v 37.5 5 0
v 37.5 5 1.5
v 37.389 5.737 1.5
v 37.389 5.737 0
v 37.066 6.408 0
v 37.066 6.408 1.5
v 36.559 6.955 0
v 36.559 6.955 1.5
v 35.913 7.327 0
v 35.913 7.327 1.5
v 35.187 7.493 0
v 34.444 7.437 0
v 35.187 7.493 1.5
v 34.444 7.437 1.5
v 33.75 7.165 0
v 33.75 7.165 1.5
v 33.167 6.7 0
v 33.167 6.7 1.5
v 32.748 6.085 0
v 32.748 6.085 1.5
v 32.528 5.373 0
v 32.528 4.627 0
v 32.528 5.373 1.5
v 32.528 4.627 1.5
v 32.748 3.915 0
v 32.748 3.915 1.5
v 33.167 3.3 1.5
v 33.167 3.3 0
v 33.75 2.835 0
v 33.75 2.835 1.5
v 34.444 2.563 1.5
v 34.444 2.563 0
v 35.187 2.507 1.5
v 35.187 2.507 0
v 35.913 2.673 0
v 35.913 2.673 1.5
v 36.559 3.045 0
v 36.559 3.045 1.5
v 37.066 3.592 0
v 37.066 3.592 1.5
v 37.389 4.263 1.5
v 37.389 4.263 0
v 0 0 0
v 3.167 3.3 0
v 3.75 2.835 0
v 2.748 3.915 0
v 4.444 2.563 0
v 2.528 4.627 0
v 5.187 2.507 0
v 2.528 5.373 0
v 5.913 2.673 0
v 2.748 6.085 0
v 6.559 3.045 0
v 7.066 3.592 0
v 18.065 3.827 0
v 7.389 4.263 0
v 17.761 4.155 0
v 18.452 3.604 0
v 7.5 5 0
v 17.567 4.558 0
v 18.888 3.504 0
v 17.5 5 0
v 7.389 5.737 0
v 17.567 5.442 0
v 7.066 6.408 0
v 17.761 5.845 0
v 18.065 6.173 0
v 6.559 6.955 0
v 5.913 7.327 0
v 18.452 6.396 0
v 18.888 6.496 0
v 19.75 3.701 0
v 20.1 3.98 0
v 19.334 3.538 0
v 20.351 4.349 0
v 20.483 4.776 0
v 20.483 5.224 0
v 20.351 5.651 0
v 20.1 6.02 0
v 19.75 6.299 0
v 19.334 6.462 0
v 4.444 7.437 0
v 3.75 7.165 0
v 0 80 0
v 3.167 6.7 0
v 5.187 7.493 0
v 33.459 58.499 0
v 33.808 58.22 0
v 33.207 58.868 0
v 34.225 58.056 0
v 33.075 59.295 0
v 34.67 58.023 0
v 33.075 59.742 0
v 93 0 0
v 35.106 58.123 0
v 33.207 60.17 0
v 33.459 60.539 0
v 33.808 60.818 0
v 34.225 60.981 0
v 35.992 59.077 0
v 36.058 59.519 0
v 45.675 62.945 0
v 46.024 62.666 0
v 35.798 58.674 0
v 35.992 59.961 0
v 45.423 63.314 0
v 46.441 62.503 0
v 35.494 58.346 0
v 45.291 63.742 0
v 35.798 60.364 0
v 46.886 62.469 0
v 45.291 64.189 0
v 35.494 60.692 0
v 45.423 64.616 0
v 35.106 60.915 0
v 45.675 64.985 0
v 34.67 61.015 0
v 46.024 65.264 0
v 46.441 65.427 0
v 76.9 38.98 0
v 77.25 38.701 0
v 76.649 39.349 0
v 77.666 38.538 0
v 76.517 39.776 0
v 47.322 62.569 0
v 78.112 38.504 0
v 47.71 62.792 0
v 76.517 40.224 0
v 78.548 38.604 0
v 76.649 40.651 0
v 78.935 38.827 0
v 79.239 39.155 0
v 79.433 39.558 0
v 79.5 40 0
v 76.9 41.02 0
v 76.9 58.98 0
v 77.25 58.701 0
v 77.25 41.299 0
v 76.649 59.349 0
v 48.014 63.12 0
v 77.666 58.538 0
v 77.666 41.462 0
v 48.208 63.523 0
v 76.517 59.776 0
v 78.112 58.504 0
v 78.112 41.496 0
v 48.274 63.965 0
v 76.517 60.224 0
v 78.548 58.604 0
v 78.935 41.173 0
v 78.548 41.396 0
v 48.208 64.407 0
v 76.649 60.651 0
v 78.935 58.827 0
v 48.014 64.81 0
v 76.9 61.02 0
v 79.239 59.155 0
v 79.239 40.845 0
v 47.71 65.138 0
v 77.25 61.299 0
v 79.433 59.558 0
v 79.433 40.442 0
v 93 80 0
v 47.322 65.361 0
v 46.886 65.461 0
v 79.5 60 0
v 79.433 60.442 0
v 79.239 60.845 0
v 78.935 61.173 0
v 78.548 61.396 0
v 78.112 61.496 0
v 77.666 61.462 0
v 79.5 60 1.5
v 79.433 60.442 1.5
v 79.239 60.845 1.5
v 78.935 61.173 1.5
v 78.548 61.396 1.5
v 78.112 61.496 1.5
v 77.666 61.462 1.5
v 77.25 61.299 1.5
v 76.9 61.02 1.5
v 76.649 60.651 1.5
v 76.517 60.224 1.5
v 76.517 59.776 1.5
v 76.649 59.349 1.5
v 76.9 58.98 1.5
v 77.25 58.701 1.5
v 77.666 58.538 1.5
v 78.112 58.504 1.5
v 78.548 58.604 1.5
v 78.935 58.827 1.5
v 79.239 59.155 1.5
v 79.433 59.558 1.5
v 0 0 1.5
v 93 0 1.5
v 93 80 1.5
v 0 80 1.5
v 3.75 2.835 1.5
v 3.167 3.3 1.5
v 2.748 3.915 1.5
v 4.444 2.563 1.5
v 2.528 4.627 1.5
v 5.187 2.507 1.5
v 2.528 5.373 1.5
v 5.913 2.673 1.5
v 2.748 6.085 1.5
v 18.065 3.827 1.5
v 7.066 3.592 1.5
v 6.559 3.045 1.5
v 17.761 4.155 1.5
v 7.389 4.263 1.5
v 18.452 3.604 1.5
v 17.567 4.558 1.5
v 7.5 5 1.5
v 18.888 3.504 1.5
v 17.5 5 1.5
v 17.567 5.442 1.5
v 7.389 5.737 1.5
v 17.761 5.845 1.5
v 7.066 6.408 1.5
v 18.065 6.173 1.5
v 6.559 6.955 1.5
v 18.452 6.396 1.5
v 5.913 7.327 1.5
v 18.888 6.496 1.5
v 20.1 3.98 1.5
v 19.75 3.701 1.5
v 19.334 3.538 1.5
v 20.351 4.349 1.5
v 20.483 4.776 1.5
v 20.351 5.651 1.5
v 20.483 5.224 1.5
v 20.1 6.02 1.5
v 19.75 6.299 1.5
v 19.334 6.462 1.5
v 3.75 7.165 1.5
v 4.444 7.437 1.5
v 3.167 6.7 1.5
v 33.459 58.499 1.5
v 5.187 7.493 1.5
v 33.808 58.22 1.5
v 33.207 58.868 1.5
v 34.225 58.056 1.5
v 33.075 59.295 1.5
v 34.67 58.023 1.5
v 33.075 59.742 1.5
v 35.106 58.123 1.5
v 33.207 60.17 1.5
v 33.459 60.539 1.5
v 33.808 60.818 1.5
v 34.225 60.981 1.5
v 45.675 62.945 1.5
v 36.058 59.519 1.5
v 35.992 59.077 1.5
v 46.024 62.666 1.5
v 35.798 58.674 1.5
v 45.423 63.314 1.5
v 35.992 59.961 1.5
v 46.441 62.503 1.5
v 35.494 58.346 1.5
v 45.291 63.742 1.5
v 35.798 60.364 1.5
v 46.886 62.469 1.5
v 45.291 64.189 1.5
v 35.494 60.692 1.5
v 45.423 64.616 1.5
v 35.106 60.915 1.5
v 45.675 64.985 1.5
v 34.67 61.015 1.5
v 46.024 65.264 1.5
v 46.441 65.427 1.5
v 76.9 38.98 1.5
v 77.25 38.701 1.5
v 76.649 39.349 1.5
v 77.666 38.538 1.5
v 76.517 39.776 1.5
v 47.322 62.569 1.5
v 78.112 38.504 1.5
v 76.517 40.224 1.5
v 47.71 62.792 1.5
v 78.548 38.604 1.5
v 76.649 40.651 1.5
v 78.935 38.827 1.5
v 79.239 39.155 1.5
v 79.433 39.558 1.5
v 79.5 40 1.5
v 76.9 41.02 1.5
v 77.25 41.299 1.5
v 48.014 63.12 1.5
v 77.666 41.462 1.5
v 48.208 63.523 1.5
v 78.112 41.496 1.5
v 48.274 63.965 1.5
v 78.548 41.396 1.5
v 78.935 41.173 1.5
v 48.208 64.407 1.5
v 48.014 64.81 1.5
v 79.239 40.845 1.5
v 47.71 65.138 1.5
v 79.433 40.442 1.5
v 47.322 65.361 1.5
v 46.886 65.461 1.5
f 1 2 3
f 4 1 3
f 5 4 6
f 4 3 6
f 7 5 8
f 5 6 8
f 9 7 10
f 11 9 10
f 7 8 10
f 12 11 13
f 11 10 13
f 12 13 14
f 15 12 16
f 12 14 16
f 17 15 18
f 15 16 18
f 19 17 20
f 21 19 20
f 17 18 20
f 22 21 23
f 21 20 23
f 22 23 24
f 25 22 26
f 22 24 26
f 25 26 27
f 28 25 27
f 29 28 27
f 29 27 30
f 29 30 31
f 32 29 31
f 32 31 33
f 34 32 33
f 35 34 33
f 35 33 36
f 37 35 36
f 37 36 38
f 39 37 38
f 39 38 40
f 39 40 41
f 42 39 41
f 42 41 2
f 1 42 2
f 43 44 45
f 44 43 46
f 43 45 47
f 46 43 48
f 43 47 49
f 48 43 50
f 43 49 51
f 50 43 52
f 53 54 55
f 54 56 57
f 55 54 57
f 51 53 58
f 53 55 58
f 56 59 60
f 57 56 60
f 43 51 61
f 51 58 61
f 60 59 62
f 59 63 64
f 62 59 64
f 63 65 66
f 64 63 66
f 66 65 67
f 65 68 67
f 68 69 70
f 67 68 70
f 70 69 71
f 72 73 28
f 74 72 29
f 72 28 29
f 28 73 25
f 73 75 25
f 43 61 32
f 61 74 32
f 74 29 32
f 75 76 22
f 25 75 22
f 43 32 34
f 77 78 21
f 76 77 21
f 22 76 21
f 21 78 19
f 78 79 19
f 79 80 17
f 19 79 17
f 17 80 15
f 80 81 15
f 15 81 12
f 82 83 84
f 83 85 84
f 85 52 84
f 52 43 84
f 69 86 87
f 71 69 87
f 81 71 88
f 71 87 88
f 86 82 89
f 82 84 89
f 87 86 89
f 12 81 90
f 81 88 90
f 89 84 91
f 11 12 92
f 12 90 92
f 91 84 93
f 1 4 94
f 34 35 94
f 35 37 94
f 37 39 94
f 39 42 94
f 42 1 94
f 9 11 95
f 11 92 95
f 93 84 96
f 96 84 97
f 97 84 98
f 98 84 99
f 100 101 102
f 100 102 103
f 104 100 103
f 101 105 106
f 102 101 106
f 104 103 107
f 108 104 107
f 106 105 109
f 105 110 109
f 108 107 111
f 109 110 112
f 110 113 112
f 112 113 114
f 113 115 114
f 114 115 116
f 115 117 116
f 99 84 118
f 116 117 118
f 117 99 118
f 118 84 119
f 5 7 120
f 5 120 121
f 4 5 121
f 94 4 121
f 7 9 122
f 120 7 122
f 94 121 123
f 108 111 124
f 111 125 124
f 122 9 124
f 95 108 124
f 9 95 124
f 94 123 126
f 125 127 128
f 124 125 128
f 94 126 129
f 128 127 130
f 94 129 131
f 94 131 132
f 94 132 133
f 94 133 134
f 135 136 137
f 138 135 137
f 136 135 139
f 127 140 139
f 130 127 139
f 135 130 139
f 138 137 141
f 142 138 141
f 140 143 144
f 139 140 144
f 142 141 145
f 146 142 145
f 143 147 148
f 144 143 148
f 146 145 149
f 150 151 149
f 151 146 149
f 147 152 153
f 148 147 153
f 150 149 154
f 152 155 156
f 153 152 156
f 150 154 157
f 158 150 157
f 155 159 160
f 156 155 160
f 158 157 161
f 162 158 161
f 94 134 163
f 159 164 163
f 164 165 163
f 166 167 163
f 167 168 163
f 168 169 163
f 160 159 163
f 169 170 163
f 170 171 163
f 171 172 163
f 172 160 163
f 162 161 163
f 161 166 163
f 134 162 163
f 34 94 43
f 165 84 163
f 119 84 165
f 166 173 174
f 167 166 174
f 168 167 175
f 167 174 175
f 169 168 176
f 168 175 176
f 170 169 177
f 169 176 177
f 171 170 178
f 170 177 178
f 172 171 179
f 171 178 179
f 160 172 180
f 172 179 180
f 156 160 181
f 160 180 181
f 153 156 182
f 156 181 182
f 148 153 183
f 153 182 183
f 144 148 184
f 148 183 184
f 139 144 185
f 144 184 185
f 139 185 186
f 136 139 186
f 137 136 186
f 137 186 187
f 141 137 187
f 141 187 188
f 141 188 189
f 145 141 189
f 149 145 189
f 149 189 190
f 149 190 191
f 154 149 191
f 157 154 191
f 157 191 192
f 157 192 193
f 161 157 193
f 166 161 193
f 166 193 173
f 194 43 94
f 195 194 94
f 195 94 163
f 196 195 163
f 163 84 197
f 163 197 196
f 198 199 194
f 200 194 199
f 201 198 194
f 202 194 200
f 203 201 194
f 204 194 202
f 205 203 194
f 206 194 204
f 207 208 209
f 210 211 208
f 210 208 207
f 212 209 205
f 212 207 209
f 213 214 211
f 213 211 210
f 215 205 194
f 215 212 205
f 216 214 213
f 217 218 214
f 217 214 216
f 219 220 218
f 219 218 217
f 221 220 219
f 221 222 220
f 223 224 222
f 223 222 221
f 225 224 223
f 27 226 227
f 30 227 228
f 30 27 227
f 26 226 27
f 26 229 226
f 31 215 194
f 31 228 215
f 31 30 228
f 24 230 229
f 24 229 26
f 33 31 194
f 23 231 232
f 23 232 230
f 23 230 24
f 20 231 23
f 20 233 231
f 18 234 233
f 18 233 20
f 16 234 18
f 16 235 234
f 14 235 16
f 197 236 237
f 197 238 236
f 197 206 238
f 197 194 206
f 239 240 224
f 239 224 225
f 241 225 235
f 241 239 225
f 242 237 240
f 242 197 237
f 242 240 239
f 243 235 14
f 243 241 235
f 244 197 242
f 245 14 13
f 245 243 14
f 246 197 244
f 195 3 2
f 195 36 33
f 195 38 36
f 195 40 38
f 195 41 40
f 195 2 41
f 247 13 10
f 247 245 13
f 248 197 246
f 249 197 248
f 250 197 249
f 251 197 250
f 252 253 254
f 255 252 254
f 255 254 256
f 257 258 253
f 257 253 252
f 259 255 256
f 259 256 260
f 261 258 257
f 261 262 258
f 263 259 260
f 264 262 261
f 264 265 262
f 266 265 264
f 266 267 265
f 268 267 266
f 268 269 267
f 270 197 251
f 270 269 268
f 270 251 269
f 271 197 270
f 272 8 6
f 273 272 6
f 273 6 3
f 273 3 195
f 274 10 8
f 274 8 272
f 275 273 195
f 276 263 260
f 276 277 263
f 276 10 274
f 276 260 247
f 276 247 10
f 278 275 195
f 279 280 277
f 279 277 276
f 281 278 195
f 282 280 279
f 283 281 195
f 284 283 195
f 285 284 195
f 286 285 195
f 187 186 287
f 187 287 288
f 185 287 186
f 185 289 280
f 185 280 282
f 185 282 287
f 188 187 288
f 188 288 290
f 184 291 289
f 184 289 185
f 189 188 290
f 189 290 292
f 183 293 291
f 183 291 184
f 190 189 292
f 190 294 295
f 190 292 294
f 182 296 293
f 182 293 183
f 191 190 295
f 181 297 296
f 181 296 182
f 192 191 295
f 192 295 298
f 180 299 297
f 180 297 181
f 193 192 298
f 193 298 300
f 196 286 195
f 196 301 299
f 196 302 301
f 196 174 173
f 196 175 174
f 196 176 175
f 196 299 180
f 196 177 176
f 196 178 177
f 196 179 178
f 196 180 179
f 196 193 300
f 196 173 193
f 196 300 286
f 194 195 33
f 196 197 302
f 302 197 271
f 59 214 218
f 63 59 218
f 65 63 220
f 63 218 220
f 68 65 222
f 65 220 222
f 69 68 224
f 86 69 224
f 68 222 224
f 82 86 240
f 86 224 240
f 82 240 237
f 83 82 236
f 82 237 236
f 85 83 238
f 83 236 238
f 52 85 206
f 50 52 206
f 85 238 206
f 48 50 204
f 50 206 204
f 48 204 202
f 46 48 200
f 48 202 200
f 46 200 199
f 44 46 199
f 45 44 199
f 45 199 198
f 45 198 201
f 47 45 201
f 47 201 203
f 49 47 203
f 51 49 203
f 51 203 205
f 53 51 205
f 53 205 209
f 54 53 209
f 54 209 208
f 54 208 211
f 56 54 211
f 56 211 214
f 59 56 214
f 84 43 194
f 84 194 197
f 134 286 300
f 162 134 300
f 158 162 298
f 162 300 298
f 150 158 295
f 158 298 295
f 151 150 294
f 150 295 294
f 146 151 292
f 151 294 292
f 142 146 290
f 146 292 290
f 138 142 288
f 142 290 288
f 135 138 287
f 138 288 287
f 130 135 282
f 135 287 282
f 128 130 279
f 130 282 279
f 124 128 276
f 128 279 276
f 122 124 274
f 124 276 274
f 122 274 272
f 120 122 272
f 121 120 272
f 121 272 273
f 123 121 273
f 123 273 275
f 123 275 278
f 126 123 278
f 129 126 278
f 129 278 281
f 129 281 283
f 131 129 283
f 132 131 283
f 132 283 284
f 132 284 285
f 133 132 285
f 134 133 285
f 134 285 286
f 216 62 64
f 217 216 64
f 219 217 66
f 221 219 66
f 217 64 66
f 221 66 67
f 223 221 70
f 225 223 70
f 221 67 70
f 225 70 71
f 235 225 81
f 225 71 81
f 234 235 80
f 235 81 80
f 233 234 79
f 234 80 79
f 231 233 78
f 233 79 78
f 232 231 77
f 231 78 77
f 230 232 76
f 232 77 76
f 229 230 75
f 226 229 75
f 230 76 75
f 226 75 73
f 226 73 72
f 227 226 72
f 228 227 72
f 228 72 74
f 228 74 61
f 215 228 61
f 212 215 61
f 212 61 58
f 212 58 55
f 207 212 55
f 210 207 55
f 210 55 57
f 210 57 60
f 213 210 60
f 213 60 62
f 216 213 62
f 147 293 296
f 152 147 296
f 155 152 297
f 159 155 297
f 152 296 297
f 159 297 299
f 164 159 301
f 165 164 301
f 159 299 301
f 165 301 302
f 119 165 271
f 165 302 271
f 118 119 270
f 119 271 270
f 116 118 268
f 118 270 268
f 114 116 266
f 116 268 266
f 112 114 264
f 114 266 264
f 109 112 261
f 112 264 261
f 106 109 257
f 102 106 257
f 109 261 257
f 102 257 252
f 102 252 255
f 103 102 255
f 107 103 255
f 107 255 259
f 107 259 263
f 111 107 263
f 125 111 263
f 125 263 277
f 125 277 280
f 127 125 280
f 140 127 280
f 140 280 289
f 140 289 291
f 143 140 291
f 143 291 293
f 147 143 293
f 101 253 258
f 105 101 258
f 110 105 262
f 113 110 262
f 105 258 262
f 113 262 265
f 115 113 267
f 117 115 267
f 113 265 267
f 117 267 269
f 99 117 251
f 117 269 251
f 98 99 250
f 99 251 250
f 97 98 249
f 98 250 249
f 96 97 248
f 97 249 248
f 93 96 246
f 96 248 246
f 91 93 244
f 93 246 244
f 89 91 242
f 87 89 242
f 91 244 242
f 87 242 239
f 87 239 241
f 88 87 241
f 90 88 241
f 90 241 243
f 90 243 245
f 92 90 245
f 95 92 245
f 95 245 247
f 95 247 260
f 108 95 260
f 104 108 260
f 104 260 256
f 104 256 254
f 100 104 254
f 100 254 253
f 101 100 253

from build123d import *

# Parameters (mm, degrees)
SKETCH1_W                       = 93
SKETCH1_H                       = 80
BOSS_EXTRUDE1_DEPTH             = 1.5
F_5_0MM_PRESS_DOWEL_HOLE1_D     = 5
F_5_0MM_PRESS_DOWEL_HOLE1_DEPTH = 6
F_5_0MM_PRESS_DOWEL_HOLE1_TIP   = 1.502151548
F_3_0MM_DOWEL_HOLE1_D           = 3
F_3_0MM_DOWEL_HOLE2_D           = 3
F_3_0MM_DOWEL_HOLE2_DEPTH       = 2.999
F_3_0MM_DOWEL_HOLE2_TIP         = 0.901290929
F_3_0MM_DOWEL_HOLE3_D           = 3


with BuildPart() as part:
    # Sketch1 → Boss-Extrude1 (new body)
    with BuildSketch(Plane.XY):
        with Locations((46.5, 40)):
            Rectangle(SKETCH1_W, SKETCH1_H)
    extrude(amount=BOSS_EXTRUDE1_DEPTH)

    # Ø5.0mm Press Dowel Hole1
    with Locations(Plane(origin=(19.881275608, -7.745569698, 0), x_dir=(-1, 0, 0), z_dir=(0, 0, -1))):
        with Locations((-15.118724392, 12.745569698), (14.881275608, 12.745569698)):
            Hole(F_5_0MM_PRESS_DOWEL_HOLE1_D / 2, depth=F_5_0MM_PRESS_DOWEL_HOLE1_DEPTH)
            with Locations((0, 0, -(F_5_0MM_PRESS_DOWEL_HOLE1_DEPTH + F_5_0MM_PRESS_DOWEL_HOLE1_TIP / 2))):  # 118° drill point
                Cone(0, F_5_0MM_PRESS_DOWEL_HOLE1_D / 2, F_5_0MM_PRESS_DOWEL_HOLE1_TIP, mode=Mode.SUBTRACT)

    # Ø3.0mm Dowel Hole1 (through all)
    with Locations(Plane(origin=(19.881275608, -7.745569698, -1.5), x_dir=(-1, 0, 0), z_dir=(0, 0, -1))):
        with Locations((-26.893032931, 71.71065686), (-14.67702886, 67.264394997)):
            Hole(F_3_0MM_DOWEL_HOLE1_D / 2)

    # Ø3.0mm Dowel Hole2
    with Locations(Plane(origin=(19.881275608, -7.745569698, 0), x_dir=(-1, 0, 0), z_dir=(0, 0, -1))):
        with Locations((-58.118724392, 67.745569698), (-58.118724392, 47.745569698)):
            Hole(F_3_0MM_DOWEL_HOLE2_D / 2, depth=F_3_0MM_DOWEL_HOLE2_DEPTH)
            with Locations((0, 0, -(F_3_0MM_DOWEL_HOLE2_DEPTH + F_3_0MM_DOWEL_HOLE2_TIP / 2))):  # 118° drill point
                Cone(0, F_3_0MM_DOWEL_HOLE2_D / 2, F_3_0MM_DOWEL_HOLE2_TIP, mode=Mode.SUBTRACT)

    # Ø3.0mm Dowel Hole3 (through all)
    with Locations(Plane(origin=(19.881275608, -7.745569698, 3), x_dir=(1, 0, 0), z_dir=(0, 0, 1))):
        with Locations((-0.881275608, 12.745569698)):
            Hole(F_3_0MM_DOWEL_HOLE3_D / 2)


solid = part.part
